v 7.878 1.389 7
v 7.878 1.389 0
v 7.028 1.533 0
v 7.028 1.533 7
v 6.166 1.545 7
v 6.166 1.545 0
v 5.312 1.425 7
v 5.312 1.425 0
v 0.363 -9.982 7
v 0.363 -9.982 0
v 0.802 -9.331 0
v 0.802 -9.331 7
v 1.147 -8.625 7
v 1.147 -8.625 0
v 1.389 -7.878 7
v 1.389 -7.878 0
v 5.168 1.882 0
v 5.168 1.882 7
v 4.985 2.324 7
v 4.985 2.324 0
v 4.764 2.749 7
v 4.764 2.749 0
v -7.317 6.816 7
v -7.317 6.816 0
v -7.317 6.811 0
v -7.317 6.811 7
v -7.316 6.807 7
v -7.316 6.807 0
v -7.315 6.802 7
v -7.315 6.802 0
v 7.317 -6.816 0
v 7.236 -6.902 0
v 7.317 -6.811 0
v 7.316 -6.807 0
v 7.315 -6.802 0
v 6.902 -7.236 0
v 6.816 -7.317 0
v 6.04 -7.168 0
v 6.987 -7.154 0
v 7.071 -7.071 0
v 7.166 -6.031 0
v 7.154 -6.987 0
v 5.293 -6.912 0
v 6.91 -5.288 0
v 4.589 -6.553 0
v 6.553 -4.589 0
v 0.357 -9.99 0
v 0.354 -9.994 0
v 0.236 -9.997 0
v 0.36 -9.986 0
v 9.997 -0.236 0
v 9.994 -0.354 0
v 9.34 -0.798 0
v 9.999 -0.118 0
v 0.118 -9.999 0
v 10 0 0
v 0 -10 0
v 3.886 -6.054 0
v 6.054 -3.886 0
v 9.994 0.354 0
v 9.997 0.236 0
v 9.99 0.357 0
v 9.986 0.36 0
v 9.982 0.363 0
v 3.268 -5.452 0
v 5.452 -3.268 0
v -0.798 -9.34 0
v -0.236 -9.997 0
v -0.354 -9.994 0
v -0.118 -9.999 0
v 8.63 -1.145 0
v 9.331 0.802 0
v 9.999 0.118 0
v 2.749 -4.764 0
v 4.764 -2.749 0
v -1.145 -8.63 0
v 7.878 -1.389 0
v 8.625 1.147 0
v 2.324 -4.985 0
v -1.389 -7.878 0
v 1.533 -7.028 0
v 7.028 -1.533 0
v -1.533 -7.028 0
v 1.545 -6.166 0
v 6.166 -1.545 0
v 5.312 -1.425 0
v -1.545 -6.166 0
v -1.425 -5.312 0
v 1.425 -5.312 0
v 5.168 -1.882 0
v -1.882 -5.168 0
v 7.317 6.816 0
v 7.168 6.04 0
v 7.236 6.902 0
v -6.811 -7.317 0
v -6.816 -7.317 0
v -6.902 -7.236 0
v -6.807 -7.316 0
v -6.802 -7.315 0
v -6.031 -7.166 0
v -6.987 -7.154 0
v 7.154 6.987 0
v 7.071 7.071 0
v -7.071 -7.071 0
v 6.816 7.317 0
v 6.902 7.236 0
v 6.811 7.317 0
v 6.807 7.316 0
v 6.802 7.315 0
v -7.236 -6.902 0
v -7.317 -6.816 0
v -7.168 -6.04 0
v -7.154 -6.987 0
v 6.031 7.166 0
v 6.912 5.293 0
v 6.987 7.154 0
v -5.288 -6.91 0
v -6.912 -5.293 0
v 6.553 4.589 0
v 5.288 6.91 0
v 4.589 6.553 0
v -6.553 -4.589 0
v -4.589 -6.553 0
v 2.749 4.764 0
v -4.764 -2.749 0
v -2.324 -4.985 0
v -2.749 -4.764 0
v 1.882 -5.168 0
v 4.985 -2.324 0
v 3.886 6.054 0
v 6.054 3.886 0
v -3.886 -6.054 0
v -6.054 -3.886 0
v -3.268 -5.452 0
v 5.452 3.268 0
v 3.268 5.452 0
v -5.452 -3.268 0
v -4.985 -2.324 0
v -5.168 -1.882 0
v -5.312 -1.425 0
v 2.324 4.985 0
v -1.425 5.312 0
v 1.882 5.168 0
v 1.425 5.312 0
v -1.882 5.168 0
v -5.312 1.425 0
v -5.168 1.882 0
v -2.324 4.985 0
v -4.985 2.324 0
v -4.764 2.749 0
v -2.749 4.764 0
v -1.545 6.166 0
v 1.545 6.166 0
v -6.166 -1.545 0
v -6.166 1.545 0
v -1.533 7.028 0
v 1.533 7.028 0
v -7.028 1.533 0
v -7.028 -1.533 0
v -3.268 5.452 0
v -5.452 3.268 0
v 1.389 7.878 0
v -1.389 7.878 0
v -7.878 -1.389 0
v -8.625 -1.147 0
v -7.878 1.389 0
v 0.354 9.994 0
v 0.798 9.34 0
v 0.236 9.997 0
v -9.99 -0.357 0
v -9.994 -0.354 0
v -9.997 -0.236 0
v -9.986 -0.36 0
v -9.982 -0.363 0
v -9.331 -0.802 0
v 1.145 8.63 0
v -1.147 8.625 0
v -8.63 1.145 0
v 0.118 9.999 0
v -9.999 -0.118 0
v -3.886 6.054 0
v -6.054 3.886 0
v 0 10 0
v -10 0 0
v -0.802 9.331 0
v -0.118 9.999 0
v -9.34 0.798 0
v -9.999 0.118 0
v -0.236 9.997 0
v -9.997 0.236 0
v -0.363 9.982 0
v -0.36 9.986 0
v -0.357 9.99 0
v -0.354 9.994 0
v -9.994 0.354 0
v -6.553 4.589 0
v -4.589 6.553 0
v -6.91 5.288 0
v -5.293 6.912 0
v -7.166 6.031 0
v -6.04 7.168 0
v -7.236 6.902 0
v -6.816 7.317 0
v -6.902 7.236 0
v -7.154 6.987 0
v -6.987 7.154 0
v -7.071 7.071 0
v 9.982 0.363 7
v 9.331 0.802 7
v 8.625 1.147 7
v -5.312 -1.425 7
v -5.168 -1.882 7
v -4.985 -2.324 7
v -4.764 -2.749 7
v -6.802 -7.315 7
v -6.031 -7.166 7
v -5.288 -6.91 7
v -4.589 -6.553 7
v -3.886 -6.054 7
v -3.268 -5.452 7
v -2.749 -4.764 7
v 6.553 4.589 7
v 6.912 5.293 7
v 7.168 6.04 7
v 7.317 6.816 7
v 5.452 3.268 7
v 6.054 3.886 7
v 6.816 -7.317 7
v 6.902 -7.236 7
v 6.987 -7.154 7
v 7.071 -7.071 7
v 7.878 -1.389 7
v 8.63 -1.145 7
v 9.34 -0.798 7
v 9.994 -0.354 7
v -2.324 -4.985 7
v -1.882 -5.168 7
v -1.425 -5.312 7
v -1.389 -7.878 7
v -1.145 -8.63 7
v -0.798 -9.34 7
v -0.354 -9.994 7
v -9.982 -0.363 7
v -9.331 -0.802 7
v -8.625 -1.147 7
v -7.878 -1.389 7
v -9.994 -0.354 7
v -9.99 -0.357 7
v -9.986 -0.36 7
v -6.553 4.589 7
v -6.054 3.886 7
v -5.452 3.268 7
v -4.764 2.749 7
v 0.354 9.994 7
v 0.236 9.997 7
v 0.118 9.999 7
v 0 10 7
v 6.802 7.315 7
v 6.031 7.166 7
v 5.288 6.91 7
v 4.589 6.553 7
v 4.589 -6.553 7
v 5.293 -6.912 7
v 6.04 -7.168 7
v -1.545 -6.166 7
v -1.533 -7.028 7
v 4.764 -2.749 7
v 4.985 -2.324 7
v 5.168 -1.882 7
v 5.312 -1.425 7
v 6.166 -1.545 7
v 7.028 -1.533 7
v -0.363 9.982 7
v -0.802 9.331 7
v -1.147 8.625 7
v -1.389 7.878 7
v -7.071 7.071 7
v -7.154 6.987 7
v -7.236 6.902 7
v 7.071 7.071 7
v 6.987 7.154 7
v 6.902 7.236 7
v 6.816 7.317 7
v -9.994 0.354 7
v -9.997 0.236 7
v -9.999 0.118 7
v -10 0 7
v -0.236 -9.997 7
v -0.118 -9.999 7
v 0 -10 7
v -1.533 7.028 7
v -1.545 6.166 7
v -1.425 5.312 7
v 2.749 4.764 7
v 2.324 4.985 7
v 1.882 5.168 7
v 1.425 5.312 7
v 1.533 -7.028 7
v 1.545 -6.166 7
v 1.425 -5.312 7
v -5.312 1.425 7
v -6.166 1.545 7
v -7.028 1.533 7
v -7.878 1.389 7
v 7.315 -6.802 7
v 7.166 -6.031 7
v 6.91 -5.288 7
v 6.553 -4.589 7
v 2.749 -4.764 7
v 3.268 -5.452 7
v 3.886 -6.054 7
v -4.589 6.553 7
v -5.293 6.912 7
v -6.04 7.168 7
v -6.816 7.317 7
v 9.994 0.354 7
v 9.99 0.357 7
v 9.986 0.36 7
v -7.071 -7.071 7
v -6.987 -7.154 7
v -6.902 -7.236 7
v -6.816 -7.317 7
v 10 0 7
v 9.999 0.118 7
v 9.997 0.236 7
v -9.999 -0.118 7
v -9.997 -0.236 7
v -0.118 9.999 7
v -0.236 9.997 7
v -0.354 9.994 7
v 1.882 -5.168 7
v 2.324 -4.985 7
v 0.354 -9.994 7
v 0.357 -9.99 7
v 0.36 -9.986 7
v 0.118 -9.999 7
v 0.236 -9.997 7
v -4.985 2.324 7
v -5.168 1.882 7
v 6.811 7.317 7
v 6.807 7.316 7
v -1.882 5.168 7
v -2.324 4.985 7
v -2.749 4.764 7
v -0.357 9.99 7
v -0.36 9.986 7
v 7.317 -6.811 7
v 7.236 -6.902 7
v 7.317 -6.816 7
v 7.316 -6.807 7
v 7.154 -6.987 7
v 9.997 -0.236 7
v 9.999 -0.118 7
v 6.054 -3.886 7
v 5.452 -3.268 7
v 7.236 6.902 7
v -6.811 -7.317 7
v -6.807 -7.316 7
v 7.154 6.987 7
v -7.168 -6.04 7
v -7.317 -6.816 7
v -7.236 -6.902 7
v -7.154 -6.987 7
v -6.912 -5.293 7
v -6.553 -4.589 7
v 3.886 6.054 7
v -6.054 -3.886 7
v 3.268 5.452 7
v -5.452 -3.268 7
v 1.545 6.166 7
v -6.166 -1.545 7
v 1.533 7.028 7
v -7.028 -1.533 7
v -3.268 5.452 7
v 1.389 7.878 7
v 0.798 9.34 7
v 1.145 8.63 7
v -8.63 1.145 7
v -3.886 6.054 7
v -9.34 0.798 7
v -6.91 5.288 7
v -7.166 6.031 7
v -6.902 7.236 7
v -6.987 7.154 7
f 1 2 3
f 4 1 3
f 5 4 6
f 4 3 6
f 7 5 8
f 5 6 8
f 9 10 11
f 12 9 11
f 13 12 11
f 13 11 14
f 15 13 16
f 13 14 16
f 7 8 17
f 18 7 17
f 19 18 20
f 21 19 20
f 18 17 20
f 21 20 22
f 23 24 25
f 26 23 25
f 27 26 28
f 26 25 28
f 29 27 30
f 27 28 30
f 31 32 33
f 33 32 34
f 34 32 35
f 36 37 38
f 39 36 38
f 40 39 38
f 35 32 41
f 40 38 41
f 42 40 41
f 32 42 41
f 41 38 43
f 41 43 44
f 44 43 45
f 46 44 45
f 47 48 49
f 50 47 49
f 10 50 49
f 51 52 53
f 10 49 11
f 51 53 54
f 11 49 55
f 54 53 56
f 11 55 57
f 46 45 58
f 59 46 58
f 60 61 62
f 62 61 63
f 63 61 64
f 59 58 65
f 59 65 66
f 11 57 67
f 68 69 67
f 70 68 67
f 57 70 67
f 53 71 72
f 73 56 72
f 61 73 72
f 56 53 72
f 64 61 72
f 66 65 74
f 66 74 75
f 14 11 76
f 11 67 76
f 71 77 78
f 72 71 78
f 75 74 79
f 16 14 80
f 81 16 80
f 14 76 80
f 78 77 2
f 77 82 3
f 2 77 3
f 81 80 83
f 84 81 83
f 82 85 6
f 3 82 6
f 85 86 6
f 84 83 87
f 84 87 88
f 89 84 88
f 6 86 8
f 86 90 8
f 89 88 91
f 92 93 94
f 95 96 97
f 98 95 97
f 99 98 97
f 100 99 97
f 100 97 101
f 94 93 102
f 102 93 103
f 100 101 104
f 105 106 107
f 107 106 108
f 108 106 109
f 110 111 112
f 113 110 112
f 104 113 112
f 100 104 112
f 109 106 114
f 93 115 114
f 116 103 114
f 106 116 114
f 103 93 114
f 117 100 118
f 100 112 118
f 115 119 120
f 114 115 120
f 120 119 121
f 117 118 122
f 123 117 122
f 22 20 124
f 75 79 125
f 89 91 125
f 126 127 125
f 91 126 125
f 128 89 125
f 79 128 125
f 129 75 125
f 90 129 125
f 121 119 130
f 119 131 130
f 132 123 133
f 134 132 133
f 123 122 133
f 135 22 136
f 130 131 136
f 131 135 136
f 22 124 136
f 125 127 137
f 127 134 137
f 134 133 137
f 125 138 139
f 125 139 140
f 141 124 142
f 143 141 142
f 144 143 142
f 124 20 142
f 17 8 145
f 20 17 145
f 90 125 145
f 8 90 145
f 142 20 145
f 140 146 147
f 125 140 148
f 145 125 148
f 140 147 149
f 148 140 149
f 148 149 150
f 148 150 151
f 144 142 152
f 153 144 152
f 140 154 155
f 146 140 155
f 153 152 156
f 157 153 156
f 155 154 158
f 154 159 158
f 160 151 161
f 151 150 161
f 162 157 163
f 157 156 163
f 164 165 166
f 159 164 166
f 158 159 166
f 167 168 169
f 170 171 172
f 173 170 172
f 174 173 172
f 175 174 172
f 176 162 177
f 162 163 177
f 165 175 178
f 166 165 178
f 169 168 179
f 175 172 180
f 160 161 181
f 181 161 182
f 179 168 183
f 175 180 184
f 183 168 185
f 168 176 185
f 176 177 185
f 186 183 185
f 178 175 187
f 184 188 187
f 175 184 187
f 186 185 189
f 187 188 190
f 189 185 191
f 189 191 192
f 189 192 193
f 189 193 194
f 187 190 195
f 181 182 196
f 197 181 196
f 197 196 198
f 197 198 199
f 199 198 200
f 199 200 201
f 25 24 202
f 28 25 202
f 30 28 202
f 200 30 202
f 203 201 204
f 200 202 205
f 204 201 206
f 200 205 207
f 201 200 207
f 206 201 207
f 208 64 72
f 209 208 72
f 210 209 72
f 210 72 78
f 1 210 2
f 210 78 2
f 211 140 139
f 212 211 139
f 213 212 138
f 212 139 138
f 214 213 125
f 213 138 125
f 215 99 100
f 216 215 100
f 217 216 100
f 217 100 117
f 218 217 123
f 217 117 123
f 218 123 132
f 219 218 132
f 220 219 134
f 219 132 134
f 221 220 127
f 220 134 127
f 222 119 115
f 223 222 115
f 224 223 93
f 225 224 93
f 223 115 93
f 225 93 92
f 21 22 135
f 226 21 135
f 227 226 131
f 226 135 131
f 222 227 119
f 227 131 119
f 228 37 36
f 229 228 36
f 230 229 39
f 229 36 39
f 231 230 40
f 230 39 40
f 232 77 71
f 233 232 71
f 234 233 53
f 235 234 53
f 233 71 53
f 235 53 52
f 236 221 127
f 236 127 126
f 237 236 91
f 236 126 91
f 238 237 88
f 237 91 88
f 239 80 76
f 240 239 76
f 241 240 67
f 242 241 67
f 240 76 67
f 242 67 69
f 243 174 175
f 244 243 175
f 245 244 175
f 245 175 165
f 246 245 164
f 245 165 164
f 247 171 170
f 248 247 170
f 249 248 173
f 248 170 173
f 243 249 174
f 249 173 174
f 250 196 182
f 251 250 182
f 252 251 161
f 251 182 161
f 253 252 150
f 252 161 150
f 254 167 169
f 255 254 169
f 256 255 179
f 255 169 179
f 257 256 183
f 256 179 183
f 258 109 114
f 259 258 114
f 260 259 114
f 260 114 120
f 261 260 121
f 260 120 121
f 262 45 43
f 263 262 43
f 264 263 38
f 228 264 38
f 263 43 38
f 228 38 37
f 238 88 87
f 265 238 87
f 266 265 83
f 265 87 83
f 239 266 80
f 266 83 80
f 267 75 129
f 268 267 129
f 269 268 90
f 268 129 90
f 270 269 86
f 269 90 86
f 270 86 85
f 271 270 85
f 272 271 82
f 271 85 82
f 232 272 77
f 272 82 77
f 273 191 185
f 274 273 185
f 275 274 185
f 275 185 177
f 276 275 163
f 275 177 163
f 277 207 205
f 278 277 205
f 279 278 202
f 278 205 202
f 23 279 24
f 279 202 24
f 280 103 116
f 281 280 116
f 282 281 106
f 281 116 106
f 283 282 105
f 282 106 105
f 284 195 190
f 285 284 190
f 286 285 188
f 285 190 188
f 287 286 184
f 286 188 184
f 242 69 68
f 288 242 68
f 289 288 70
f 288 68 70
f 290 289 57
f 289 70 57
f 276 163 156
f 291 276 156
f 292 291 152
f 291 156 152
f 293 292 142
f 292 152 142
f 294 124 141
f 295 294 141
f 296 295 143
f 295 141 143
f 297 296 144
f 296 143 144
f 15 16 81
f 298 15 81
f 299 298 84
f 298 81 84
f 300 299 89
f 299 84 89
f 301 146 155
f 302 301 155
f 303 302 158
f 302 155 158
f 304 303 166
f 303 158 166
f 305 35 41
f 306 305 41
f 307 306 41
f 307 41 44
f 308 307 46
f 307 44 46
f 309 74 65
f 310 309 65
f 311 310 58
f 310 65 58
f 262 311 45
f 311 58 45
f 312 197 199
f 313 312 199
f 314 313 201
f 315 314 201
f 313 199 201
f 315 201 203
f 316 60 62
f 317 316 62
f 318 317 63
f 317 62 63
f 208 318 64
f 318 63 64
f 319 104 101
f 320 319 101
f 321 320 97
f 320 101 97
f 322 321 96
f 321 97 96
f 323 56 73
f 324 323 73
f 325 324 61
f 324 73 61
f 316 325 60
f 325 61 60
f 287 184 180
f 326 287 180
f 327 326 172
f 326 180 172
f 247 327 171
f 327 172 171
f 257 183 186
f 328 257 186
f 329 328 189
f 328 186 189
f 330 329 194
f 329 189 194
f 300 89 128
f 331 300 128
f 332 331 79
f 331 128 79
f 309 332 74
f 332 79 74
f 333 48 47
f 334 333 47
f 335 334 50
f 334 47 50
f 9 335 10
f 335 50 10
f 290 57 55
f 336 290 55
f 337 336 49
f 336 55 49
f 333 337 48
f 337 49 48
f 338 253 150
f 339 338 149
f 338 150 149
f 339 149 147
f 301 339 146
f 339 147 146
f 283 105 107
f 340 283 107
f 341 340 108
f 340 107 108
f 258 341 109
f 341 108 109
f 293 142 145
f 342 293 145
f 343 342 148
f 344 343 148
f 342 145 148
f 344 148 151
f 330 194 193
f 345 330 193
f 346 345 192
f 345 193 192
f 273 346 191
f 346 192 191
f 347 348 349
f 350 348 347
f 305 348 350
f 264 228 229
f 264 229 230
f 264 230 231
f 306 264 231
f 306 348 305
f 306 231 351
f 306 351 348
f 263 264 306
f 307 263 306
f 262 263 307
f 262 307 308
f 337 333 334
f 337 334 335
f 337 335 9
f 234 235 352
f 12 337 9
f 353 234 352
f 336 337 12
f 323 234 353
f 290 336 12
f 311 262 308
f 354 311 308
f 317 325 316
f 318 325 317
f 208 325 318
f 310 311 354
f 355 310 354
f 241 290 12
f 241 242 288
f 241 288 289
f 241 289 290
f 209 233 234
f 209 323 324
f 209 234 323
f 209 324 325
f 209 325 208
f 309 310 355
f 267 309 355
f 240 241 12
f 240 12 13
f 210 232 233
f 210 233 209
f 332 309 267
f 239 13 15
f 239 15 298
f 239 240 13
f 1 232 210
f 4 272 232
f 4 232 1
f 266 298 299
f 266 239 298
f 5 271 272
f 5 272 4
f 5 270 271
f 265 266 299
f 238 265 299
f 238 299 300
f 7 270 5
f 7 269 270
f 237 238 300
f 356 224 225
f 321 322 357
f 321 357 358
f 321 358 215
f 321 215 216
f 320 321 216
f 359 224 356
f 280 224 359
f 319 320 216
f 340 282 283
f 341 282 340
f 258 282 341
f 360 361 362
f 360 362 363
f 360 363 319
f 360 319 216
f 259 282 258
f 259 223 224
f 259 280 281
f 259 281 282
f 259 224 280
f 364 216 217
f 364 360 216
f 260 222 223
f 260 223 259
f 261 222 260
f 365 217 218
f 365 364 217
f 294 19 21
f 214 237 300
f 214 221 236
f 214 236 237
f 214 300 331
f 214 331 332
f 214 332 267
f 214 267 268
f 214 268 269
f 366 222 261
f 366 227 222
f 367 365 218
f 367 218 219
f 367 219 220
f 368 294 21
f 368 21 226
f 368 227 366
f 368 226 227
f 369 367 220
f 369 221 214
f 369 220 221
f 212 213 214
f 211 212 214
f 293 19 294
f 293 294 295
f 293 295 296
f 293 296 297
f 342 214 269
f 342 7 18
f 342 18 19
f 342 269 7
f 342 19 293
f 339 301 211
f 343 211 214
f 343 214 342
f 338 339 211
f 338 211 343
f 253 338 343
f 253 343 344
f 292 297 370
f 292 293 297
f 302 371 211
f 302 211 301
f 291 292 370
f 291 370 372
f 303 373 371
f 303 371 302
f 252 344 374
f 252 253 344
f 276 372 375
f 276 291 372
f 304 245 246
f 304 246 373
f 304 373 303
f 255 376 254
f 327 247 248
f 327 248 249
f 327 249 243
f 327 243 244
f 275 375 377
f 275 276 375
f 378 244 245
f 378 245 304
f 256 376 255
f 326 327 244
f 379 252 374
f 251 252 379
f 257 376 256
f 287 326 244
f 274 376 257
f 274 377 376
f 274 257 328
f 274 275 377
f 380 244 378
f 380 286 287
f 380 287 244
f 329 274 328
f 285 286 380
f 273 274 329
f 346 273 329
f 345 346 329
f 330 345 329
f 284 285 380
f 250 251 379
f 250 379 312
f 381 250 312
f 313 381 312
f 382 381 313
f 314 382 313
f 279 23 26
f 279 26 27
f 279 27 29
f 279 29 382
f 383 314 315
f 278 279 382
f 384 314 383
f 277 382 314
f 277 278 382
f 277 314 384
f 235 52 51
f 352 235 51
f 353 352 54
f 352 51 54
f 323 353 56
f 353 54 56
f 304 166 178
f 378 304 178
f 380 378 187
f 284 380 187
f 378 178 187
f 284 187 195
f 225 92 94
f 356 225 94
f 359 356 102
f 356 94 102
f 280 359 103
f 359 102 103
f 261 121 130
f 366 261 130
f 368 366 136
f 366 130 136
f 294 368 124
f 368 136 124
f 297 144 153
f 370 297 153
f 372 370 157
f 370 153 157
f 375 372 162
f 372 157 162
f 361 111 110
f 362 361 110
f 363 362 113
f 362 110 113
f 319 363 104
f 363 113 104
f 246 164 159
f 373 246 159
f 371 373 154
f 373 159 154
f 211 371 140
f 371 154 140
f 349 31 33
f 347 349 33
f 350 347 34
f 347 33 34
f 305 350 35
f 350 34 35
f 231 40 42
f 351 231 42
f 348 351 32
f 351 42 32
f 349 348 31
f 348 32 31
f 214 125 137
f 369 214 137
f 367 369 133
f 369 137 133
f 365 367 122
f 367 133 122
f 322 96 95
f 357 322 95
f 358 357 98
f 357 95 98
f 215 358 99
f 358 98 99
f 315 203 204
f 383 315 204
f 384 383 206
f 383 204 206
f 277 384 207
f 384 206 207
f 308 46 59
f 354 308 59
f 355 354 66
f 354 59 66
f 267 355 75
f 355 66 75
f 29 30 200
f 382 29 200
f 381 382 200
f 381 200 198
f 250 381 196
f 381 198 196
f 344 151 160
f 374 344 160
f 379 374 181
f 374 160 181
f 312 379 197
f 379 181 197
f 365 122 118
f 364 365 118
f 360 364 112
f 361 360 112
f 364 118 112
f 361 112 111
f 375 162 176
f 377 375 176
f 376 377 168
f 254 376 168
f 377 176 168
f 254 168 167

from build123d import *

# Parameters (mm, degrees)
F1_DEPTH = 7
F3_COUNT = 8
F3_ANGLE = 315


with BuildPart() as f1:
    # F0 (on Top) → F1 (new body)
    with BuildSketch(Plane.XY):
        with BuildLine():
            ThreePointArc((-1.4249641593, 5.3122007817), (-3.3475884696, -4.3639032343), (5.5, 0))
            ThreePointArc((5.5, 0), (4.3639032343, 3.3475884696), (1.4249641593, 5.3122007817))
            ThreePointArc((1.4249641593, 5.3122007817), (0, 5.5), (-1.4249641593, 5.3122007817))
        make_face()
        with BuildLine():
            ThreePointArc((-1.4249641593, 5.3122007817), (0, 5.5), (1.4249641593, 5.3122007817))
            ThreePointArc((1.4249641593, 5.3122007817), (1.5553934353, 6.597399257), (1.3891854213, 7.8784620241))
            ThreePointArc((1.3891854213, 7.8784620241), (0.9837129389, 8.990847184), (0.3543820184, 9.9937186965))
            ThreePointArc((0.3543820184, 9.9937186965), (0.1772188405, 9.9984295508), (0, 10))
            ThreePointArc((0, 10), (-0.1772188405, 9.9984295508), (-0.3543820184, 9.9937186965))
            ThreePointArc((-0.3543820184, 9.9937186965), (-0.3587995186, 9.9880877162), (-0.3632098505, 9.9824511198))
            ThreePointArc((-0.3632098505, 9.9824511198), (-0.9868539257, 8.9844162861), (-1.3891854213, 7.8784620241))
            ThreePointArc((-1.3891854213, 7.8784620241), (-1.5553934353, 6.597399257), (-1.4249641593, 5.3122007817))
        make_face()
    extrude(amount=F1_DEPTH)


with BuildPart() as f3_1:
    # F3: instance of F1
    add(f1.part.rotate(Axis((0, 0, 21.9664014876), (0, 0, -1)), 1 * F3_ANGLE / (F3_COUNT - 1)))


with BuildPart() as f3_2:
    # F3: instance of F1
    add(f1.part.rotate(Axis((0, 0, 21.9664014876), (0, 0, -1)), 2 * F3_ANGLE / (F3_COUNT - 1)))


with BuildPart() as f3_3:
    # F3: instance of F1
    add(f1.part.rotate(Axis((0, 0, 21.9664014876), (0, 0, -1)), 3 * F3_ANGLE / (F3_COUNT - 1)))


with BuildPart() as f3_4:
    # F3: instance of F1
    add(f1.part.rotate(Axis((0, 0, 21.9664014876), (0, 0, -1)), 4 * F3_ANGLE / (F3_COUNT - 1)))


with BuildPart() as f3_5:
    # F3: instance of F1
    add(f1.part.rotate(Axis((0, 0, 21.9664014876), (0, 0, -1)), 5 * F3_ANGLE / (F3_COUNT - 1)))


with BuildPart() as f3_6:
    # F3: instance of F1
    add(f1.part.rotate(Axis((0, 0, 21.9664014876), (0, 0, -1)), 6 * F3_ANGLE / (F3_COUNT - 1)))


with BuildPart() as f3_7:
    # F3: instance of F1
    add(f1.part.rotate(Axis((0, 0, 21.9664014876), (0, 0, -1)), 7 * F3_ANGLE / (F3_COUNT - 1)))


with BuildPart() as f3_6_1:
    add(f3_6.part)

    # F4: union F3_5, F3_4, F3_3, F3_2, F3_1, F1, F3_7
    add(f3_5.part)
    add(f3_4.part)
    add(f3_3.part)
    add(f3_2.part)
    add(f3_1.part)
    add(f1.part)
    add(f3_7.part)


solid = f3_6_1.part
